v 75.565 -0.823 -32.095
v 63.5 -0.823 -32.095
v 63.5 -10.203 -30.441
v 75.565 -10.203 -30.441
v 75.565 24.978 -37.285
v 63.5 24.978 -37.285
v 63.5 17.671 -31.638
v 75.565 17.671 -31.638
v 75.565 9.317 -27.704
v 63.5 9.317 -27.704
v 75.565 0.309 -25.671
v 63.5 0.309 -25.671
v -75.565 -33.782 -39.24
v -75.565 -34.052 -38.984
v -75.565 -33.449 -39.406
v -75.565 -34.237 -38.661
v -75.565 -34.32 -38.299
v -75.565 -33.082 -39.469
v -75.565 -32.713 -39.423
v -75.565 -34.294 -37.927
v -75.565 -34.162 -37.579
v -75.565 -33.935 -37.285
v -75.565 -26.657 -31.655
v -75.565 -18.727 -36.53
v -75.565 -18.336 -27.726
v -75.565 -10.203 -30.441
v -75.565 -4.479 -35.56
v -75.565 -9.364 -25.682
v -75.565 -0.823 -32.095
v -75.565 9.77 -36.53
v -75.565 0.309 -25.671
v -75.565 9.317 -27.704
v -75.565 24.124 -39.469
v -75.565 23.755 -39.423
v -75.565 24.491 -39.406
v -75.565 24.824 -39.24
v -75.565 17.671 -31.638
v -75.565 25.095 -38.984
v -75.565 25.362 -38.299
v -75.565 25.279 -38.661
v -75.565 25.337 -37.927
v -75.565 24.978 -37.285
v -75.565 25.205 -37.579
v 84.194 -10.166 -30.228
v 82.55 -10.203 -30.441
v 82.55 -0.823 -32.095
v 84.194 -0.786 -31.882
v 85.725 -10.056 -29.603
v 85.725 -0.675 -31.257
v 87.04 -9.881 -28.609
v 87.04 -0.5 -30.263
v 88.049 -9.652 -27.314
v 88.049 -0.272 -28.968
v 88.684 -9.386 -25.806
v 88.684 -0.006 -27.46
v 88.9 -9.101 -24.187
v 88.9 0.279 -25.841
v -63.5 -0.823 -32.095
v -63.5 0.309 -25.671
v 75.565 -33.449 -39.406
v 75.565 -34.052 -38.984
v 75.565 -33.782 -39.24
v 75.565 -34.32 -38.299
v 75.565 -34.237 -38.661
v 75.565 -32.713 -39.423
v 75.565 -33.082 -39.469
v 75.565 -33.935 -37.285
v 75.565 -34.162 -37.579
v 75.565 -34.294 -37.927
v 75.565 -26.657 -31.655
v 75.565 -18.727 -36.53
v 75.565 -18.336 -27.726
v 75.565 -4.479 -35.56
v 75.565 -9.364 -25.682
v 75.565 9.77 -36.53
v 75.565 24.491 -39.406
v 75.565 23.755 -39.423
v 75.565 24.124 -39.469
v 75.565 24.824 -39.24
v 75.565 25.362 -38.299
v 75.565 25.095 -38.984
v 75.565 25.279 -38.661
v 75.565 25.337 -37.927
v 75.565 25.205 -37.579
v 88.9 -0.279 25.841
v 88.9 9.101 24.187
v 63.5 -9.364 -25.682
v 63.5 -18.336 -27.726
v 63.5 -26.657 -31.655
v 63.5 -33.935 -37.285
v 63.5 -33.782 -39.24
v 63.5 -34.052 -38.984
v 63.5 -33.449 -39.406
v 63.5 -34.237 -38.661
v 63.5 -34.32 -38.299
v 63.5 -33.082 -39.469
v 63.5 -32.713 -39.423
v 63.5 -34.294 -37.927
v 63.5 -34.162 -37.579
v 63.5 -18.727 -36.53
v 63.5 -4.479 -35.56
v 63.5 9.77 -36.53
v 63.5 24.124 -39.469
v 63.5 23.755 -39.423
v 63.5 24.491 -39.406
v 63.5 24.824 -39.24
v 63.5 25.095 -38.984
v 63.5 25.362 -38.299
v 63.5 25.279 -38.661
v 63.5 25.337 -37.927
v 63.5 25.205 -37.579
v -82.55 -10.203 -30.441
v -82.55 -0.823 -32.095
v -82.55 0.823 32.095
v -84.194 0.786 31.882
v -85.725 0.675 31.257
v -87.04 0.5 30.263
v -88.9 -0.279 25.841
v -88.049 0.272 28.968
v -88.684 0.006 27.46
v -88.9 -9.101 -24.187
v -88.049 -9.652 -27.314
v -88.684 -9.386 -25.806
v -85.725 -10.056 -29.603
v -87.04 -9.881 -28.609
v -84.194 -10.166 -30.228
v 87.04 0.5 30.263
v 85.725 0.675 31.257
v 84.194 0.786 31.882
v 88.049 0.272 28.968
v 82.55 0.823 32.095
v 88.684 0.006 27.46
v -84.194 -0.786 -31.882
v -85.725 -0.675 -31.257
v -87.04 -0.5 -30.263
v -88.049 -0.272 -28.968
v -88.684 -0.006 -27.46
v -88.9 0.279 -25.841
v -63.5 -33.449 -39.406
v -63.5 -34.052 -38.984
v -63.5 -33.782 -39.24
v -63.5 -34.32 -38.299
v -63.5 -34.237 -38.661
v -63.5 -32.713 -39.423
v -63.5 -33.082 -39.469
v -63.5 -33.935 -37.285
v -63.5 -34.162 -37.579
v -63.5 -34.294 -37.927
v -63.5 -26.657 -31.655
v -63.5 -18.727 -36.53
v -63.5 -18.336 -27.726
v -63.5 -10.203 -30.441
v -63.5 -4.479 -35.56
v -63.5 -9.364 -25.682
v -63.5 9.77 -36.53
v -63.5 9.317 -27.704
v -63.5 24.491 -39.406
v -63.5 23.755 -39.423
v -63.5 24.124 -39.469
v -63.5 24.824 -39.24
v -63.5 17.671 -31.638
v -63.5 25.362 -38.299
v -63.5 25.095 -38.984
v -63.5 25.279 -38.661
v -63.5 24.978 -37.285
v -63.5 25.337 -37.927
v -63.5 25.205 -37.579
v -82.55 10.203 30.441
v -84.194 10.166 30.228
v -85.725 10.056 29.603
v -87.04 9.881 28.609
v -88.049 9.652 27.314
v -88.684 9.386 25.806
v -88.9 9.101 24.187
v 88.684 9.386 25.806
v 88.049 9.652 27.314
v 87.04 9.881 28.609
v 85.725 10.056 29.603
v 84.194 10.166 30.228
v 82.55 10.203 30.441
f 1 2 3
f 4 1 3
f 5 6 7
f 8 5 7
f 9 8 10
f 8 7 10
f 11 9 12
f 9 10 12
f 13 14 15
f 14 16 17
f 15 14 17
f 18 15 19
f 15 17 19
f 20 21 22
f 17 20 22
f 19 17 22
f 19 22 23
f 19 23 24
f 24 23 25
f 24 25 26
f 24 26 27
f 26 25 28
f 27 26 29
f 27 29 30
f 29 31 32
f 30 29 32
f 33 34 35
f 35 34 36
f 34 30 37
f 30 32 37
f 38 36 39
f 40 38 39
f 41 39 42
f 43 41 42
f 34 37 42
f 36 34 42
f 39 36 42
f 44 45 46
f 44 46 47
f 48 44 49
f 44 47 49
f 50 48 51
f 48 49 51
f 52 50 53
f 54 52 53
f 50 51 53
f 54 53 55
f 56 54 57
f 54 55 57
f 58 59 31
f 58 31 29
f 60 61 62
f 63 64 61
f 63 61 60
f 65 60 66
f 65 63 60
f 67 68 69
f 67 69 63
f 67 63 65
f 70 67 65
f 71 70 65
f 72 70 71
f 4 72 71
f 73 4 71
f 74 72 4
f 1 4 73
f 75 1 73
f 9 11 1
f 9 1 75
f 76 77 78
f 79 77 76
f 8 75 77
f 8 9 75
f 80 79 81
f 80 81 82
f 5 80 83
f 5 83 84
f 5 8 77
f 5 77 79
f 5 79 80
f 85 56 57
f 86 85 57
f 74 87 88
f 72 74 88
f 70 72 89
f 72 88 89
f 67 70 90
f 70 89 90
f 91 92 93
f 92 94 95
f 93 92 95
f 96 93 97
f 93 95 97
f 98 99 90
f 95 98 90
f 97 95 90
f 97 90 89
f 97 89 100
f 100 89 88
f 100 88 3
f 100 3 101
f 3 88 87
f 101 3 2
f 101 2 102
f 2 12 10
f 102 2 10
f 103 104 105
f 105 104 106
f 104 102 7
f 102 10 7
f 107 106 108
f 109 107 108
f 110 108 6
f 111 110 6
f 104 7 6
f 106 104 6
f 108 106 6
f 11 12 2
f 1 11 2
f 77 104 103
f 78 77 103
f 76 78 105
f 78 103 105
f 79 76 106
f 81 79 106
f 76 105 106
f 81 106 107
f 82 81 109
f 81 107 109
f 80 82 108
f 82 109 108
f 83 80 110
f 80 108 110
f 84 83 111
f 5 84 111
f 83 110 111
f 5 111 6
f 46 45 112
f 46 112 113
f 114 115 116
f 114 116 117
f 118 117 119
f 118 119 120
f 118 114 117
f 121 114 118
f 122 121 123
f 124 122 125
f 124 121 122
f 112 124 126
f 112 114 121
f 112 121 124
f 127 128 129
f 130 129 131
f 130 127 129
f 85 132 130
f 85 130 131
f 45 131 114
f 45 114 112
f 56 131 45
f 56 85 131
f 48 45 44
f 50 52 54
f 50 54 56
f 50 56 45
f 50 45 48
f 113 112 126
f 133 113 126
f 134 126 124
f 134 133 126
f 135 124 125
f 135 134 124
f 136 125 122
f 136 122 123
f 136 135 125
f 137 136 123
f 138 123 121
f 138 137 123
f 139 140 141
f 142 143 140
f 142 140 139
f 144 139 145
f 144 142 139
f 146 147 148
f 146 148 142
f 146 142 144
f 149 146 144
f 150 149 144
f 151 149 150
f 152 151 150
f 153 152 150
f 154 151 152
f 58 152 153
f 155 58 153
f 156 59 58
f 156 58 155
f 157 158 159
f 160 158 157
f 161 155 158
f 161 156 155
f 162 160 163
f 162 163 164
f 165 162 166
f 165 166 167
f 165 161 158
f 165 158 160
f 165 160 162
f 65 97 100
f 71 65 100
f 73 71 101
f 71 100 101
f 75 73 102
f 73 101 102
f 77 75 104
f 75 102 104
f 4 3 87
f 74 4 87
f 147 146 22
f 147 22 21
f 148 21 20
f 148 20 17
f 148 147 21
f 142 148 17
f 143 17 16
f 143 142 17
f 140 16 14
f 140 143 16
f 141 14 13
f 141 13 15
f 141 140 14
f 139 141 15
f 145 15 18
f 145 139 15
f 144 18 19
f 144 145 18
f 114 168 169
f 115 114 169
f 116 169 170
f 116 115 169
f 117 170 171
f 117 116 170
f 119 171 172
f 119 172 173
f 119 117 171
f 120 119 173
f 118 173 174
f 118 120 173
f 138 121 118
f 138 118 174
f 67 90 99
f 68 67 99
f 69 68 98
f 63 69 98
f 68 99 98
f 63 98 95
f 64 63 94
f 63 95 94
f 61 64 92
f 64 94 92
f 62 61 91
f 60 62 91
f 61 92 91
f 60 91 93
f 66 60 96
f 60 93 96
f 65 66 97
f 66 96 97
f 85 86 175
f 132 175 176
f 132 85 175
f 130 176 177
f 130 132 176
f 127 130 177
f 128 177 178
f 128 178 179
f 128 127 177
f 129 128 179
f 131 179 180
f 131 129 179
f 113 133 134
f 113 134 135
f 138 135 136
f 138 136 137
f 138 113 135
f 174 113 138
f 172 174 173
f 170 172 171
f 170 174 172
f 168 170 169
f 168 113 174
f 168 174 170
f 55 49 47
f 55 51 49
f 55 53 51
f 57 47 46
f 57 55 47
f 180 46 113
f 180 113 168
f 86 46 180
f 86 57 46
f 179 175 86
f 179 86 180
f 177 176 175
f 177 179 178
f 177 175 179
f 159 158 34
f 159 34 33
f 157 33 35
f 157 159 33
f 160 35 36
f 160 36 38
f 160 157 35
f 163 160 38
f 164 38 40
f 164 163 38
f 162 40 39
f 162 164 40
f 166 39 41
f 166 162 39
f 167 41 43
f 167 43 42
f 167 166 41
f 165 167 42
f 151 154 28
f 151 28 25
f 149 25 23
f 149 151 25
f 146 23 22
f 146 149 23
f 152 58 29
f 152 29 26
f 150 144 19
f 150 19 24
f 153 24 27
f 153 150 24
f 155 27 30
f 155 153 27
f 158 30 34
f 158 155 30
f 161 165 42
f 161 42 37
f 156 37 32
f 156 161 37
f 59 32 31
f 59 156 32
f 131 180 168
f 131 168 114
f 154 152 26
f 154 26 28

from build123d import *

# Parameters (mm, degrees)
F1_DEPTH = 88.9
F2_R     = 6.35
F5_DEPTH = 12.065


with BuildPart() as f1:
    # F0 (on Right) → F1 (new body, symmetric)
    with BuildSketch(Plane.YZ):
        Polygon((-0.823183, -32.094646), (10.203477, 30.440647), (0.823183, 32.094646), (-10.203477, -30.440647), align=None)
    extrude(amount=F1_DEPTH, both=True)

    # F2
    f2_edges = [f1.edges().sort_by_distance(p)[0] for p in [
        (88.9, 5.51333, 31.267646),
        (88.9, -5.51333, -31.267646),
        (-88.9, 5.51333, 31.267646),
        (-88.9, -5.51333, -31.267646),
    ]]
    fillet(f2_edges, radius=F2_R)


with BuildPart() as f5:
    # F4 (on offset) → F5 (new body)
    with BuildSketch(Plane.YZ.offset(63.5)):
        with BuildLine():
            ThreePointArc((-32.712606, -39.422522), (-4.478705, -35.56), (23.755195, -39.422522))
            ThreePointArc((23.755195, -39.422522), (25.198768, -38.829624), (24.977638, -37.284783))
            ThreePointArc((24.977638, -37.284783), (13.601463, -29.443255), (0.309491, -25.670935))
            Line((0.309491, -25.670935), (-0.823183, -32.094646))
            Line((-0.823183, -32.094646), (-10.203477, -30.440647))
            Line((-10.203477, -30.440647), (-9.36442, -25.68212))
            ThreePointArc((-9.36442, -25.68212), (-22.603266, -29.464186), (-33.935049, -37.284783))
            ThreePointArc((-33.935049, -37.284783), (-34.156179, -38.829624), (-32.712606, -39.422522))
        make_face()
    extrude(amount=F5_DEPTH)


with BuildPart() as f6_1:
    # F6: instance of F5
    add(f5.part.mirror(Plane.YZ))


solid = Compound([f1.part, f5.part, f6_1.part])
